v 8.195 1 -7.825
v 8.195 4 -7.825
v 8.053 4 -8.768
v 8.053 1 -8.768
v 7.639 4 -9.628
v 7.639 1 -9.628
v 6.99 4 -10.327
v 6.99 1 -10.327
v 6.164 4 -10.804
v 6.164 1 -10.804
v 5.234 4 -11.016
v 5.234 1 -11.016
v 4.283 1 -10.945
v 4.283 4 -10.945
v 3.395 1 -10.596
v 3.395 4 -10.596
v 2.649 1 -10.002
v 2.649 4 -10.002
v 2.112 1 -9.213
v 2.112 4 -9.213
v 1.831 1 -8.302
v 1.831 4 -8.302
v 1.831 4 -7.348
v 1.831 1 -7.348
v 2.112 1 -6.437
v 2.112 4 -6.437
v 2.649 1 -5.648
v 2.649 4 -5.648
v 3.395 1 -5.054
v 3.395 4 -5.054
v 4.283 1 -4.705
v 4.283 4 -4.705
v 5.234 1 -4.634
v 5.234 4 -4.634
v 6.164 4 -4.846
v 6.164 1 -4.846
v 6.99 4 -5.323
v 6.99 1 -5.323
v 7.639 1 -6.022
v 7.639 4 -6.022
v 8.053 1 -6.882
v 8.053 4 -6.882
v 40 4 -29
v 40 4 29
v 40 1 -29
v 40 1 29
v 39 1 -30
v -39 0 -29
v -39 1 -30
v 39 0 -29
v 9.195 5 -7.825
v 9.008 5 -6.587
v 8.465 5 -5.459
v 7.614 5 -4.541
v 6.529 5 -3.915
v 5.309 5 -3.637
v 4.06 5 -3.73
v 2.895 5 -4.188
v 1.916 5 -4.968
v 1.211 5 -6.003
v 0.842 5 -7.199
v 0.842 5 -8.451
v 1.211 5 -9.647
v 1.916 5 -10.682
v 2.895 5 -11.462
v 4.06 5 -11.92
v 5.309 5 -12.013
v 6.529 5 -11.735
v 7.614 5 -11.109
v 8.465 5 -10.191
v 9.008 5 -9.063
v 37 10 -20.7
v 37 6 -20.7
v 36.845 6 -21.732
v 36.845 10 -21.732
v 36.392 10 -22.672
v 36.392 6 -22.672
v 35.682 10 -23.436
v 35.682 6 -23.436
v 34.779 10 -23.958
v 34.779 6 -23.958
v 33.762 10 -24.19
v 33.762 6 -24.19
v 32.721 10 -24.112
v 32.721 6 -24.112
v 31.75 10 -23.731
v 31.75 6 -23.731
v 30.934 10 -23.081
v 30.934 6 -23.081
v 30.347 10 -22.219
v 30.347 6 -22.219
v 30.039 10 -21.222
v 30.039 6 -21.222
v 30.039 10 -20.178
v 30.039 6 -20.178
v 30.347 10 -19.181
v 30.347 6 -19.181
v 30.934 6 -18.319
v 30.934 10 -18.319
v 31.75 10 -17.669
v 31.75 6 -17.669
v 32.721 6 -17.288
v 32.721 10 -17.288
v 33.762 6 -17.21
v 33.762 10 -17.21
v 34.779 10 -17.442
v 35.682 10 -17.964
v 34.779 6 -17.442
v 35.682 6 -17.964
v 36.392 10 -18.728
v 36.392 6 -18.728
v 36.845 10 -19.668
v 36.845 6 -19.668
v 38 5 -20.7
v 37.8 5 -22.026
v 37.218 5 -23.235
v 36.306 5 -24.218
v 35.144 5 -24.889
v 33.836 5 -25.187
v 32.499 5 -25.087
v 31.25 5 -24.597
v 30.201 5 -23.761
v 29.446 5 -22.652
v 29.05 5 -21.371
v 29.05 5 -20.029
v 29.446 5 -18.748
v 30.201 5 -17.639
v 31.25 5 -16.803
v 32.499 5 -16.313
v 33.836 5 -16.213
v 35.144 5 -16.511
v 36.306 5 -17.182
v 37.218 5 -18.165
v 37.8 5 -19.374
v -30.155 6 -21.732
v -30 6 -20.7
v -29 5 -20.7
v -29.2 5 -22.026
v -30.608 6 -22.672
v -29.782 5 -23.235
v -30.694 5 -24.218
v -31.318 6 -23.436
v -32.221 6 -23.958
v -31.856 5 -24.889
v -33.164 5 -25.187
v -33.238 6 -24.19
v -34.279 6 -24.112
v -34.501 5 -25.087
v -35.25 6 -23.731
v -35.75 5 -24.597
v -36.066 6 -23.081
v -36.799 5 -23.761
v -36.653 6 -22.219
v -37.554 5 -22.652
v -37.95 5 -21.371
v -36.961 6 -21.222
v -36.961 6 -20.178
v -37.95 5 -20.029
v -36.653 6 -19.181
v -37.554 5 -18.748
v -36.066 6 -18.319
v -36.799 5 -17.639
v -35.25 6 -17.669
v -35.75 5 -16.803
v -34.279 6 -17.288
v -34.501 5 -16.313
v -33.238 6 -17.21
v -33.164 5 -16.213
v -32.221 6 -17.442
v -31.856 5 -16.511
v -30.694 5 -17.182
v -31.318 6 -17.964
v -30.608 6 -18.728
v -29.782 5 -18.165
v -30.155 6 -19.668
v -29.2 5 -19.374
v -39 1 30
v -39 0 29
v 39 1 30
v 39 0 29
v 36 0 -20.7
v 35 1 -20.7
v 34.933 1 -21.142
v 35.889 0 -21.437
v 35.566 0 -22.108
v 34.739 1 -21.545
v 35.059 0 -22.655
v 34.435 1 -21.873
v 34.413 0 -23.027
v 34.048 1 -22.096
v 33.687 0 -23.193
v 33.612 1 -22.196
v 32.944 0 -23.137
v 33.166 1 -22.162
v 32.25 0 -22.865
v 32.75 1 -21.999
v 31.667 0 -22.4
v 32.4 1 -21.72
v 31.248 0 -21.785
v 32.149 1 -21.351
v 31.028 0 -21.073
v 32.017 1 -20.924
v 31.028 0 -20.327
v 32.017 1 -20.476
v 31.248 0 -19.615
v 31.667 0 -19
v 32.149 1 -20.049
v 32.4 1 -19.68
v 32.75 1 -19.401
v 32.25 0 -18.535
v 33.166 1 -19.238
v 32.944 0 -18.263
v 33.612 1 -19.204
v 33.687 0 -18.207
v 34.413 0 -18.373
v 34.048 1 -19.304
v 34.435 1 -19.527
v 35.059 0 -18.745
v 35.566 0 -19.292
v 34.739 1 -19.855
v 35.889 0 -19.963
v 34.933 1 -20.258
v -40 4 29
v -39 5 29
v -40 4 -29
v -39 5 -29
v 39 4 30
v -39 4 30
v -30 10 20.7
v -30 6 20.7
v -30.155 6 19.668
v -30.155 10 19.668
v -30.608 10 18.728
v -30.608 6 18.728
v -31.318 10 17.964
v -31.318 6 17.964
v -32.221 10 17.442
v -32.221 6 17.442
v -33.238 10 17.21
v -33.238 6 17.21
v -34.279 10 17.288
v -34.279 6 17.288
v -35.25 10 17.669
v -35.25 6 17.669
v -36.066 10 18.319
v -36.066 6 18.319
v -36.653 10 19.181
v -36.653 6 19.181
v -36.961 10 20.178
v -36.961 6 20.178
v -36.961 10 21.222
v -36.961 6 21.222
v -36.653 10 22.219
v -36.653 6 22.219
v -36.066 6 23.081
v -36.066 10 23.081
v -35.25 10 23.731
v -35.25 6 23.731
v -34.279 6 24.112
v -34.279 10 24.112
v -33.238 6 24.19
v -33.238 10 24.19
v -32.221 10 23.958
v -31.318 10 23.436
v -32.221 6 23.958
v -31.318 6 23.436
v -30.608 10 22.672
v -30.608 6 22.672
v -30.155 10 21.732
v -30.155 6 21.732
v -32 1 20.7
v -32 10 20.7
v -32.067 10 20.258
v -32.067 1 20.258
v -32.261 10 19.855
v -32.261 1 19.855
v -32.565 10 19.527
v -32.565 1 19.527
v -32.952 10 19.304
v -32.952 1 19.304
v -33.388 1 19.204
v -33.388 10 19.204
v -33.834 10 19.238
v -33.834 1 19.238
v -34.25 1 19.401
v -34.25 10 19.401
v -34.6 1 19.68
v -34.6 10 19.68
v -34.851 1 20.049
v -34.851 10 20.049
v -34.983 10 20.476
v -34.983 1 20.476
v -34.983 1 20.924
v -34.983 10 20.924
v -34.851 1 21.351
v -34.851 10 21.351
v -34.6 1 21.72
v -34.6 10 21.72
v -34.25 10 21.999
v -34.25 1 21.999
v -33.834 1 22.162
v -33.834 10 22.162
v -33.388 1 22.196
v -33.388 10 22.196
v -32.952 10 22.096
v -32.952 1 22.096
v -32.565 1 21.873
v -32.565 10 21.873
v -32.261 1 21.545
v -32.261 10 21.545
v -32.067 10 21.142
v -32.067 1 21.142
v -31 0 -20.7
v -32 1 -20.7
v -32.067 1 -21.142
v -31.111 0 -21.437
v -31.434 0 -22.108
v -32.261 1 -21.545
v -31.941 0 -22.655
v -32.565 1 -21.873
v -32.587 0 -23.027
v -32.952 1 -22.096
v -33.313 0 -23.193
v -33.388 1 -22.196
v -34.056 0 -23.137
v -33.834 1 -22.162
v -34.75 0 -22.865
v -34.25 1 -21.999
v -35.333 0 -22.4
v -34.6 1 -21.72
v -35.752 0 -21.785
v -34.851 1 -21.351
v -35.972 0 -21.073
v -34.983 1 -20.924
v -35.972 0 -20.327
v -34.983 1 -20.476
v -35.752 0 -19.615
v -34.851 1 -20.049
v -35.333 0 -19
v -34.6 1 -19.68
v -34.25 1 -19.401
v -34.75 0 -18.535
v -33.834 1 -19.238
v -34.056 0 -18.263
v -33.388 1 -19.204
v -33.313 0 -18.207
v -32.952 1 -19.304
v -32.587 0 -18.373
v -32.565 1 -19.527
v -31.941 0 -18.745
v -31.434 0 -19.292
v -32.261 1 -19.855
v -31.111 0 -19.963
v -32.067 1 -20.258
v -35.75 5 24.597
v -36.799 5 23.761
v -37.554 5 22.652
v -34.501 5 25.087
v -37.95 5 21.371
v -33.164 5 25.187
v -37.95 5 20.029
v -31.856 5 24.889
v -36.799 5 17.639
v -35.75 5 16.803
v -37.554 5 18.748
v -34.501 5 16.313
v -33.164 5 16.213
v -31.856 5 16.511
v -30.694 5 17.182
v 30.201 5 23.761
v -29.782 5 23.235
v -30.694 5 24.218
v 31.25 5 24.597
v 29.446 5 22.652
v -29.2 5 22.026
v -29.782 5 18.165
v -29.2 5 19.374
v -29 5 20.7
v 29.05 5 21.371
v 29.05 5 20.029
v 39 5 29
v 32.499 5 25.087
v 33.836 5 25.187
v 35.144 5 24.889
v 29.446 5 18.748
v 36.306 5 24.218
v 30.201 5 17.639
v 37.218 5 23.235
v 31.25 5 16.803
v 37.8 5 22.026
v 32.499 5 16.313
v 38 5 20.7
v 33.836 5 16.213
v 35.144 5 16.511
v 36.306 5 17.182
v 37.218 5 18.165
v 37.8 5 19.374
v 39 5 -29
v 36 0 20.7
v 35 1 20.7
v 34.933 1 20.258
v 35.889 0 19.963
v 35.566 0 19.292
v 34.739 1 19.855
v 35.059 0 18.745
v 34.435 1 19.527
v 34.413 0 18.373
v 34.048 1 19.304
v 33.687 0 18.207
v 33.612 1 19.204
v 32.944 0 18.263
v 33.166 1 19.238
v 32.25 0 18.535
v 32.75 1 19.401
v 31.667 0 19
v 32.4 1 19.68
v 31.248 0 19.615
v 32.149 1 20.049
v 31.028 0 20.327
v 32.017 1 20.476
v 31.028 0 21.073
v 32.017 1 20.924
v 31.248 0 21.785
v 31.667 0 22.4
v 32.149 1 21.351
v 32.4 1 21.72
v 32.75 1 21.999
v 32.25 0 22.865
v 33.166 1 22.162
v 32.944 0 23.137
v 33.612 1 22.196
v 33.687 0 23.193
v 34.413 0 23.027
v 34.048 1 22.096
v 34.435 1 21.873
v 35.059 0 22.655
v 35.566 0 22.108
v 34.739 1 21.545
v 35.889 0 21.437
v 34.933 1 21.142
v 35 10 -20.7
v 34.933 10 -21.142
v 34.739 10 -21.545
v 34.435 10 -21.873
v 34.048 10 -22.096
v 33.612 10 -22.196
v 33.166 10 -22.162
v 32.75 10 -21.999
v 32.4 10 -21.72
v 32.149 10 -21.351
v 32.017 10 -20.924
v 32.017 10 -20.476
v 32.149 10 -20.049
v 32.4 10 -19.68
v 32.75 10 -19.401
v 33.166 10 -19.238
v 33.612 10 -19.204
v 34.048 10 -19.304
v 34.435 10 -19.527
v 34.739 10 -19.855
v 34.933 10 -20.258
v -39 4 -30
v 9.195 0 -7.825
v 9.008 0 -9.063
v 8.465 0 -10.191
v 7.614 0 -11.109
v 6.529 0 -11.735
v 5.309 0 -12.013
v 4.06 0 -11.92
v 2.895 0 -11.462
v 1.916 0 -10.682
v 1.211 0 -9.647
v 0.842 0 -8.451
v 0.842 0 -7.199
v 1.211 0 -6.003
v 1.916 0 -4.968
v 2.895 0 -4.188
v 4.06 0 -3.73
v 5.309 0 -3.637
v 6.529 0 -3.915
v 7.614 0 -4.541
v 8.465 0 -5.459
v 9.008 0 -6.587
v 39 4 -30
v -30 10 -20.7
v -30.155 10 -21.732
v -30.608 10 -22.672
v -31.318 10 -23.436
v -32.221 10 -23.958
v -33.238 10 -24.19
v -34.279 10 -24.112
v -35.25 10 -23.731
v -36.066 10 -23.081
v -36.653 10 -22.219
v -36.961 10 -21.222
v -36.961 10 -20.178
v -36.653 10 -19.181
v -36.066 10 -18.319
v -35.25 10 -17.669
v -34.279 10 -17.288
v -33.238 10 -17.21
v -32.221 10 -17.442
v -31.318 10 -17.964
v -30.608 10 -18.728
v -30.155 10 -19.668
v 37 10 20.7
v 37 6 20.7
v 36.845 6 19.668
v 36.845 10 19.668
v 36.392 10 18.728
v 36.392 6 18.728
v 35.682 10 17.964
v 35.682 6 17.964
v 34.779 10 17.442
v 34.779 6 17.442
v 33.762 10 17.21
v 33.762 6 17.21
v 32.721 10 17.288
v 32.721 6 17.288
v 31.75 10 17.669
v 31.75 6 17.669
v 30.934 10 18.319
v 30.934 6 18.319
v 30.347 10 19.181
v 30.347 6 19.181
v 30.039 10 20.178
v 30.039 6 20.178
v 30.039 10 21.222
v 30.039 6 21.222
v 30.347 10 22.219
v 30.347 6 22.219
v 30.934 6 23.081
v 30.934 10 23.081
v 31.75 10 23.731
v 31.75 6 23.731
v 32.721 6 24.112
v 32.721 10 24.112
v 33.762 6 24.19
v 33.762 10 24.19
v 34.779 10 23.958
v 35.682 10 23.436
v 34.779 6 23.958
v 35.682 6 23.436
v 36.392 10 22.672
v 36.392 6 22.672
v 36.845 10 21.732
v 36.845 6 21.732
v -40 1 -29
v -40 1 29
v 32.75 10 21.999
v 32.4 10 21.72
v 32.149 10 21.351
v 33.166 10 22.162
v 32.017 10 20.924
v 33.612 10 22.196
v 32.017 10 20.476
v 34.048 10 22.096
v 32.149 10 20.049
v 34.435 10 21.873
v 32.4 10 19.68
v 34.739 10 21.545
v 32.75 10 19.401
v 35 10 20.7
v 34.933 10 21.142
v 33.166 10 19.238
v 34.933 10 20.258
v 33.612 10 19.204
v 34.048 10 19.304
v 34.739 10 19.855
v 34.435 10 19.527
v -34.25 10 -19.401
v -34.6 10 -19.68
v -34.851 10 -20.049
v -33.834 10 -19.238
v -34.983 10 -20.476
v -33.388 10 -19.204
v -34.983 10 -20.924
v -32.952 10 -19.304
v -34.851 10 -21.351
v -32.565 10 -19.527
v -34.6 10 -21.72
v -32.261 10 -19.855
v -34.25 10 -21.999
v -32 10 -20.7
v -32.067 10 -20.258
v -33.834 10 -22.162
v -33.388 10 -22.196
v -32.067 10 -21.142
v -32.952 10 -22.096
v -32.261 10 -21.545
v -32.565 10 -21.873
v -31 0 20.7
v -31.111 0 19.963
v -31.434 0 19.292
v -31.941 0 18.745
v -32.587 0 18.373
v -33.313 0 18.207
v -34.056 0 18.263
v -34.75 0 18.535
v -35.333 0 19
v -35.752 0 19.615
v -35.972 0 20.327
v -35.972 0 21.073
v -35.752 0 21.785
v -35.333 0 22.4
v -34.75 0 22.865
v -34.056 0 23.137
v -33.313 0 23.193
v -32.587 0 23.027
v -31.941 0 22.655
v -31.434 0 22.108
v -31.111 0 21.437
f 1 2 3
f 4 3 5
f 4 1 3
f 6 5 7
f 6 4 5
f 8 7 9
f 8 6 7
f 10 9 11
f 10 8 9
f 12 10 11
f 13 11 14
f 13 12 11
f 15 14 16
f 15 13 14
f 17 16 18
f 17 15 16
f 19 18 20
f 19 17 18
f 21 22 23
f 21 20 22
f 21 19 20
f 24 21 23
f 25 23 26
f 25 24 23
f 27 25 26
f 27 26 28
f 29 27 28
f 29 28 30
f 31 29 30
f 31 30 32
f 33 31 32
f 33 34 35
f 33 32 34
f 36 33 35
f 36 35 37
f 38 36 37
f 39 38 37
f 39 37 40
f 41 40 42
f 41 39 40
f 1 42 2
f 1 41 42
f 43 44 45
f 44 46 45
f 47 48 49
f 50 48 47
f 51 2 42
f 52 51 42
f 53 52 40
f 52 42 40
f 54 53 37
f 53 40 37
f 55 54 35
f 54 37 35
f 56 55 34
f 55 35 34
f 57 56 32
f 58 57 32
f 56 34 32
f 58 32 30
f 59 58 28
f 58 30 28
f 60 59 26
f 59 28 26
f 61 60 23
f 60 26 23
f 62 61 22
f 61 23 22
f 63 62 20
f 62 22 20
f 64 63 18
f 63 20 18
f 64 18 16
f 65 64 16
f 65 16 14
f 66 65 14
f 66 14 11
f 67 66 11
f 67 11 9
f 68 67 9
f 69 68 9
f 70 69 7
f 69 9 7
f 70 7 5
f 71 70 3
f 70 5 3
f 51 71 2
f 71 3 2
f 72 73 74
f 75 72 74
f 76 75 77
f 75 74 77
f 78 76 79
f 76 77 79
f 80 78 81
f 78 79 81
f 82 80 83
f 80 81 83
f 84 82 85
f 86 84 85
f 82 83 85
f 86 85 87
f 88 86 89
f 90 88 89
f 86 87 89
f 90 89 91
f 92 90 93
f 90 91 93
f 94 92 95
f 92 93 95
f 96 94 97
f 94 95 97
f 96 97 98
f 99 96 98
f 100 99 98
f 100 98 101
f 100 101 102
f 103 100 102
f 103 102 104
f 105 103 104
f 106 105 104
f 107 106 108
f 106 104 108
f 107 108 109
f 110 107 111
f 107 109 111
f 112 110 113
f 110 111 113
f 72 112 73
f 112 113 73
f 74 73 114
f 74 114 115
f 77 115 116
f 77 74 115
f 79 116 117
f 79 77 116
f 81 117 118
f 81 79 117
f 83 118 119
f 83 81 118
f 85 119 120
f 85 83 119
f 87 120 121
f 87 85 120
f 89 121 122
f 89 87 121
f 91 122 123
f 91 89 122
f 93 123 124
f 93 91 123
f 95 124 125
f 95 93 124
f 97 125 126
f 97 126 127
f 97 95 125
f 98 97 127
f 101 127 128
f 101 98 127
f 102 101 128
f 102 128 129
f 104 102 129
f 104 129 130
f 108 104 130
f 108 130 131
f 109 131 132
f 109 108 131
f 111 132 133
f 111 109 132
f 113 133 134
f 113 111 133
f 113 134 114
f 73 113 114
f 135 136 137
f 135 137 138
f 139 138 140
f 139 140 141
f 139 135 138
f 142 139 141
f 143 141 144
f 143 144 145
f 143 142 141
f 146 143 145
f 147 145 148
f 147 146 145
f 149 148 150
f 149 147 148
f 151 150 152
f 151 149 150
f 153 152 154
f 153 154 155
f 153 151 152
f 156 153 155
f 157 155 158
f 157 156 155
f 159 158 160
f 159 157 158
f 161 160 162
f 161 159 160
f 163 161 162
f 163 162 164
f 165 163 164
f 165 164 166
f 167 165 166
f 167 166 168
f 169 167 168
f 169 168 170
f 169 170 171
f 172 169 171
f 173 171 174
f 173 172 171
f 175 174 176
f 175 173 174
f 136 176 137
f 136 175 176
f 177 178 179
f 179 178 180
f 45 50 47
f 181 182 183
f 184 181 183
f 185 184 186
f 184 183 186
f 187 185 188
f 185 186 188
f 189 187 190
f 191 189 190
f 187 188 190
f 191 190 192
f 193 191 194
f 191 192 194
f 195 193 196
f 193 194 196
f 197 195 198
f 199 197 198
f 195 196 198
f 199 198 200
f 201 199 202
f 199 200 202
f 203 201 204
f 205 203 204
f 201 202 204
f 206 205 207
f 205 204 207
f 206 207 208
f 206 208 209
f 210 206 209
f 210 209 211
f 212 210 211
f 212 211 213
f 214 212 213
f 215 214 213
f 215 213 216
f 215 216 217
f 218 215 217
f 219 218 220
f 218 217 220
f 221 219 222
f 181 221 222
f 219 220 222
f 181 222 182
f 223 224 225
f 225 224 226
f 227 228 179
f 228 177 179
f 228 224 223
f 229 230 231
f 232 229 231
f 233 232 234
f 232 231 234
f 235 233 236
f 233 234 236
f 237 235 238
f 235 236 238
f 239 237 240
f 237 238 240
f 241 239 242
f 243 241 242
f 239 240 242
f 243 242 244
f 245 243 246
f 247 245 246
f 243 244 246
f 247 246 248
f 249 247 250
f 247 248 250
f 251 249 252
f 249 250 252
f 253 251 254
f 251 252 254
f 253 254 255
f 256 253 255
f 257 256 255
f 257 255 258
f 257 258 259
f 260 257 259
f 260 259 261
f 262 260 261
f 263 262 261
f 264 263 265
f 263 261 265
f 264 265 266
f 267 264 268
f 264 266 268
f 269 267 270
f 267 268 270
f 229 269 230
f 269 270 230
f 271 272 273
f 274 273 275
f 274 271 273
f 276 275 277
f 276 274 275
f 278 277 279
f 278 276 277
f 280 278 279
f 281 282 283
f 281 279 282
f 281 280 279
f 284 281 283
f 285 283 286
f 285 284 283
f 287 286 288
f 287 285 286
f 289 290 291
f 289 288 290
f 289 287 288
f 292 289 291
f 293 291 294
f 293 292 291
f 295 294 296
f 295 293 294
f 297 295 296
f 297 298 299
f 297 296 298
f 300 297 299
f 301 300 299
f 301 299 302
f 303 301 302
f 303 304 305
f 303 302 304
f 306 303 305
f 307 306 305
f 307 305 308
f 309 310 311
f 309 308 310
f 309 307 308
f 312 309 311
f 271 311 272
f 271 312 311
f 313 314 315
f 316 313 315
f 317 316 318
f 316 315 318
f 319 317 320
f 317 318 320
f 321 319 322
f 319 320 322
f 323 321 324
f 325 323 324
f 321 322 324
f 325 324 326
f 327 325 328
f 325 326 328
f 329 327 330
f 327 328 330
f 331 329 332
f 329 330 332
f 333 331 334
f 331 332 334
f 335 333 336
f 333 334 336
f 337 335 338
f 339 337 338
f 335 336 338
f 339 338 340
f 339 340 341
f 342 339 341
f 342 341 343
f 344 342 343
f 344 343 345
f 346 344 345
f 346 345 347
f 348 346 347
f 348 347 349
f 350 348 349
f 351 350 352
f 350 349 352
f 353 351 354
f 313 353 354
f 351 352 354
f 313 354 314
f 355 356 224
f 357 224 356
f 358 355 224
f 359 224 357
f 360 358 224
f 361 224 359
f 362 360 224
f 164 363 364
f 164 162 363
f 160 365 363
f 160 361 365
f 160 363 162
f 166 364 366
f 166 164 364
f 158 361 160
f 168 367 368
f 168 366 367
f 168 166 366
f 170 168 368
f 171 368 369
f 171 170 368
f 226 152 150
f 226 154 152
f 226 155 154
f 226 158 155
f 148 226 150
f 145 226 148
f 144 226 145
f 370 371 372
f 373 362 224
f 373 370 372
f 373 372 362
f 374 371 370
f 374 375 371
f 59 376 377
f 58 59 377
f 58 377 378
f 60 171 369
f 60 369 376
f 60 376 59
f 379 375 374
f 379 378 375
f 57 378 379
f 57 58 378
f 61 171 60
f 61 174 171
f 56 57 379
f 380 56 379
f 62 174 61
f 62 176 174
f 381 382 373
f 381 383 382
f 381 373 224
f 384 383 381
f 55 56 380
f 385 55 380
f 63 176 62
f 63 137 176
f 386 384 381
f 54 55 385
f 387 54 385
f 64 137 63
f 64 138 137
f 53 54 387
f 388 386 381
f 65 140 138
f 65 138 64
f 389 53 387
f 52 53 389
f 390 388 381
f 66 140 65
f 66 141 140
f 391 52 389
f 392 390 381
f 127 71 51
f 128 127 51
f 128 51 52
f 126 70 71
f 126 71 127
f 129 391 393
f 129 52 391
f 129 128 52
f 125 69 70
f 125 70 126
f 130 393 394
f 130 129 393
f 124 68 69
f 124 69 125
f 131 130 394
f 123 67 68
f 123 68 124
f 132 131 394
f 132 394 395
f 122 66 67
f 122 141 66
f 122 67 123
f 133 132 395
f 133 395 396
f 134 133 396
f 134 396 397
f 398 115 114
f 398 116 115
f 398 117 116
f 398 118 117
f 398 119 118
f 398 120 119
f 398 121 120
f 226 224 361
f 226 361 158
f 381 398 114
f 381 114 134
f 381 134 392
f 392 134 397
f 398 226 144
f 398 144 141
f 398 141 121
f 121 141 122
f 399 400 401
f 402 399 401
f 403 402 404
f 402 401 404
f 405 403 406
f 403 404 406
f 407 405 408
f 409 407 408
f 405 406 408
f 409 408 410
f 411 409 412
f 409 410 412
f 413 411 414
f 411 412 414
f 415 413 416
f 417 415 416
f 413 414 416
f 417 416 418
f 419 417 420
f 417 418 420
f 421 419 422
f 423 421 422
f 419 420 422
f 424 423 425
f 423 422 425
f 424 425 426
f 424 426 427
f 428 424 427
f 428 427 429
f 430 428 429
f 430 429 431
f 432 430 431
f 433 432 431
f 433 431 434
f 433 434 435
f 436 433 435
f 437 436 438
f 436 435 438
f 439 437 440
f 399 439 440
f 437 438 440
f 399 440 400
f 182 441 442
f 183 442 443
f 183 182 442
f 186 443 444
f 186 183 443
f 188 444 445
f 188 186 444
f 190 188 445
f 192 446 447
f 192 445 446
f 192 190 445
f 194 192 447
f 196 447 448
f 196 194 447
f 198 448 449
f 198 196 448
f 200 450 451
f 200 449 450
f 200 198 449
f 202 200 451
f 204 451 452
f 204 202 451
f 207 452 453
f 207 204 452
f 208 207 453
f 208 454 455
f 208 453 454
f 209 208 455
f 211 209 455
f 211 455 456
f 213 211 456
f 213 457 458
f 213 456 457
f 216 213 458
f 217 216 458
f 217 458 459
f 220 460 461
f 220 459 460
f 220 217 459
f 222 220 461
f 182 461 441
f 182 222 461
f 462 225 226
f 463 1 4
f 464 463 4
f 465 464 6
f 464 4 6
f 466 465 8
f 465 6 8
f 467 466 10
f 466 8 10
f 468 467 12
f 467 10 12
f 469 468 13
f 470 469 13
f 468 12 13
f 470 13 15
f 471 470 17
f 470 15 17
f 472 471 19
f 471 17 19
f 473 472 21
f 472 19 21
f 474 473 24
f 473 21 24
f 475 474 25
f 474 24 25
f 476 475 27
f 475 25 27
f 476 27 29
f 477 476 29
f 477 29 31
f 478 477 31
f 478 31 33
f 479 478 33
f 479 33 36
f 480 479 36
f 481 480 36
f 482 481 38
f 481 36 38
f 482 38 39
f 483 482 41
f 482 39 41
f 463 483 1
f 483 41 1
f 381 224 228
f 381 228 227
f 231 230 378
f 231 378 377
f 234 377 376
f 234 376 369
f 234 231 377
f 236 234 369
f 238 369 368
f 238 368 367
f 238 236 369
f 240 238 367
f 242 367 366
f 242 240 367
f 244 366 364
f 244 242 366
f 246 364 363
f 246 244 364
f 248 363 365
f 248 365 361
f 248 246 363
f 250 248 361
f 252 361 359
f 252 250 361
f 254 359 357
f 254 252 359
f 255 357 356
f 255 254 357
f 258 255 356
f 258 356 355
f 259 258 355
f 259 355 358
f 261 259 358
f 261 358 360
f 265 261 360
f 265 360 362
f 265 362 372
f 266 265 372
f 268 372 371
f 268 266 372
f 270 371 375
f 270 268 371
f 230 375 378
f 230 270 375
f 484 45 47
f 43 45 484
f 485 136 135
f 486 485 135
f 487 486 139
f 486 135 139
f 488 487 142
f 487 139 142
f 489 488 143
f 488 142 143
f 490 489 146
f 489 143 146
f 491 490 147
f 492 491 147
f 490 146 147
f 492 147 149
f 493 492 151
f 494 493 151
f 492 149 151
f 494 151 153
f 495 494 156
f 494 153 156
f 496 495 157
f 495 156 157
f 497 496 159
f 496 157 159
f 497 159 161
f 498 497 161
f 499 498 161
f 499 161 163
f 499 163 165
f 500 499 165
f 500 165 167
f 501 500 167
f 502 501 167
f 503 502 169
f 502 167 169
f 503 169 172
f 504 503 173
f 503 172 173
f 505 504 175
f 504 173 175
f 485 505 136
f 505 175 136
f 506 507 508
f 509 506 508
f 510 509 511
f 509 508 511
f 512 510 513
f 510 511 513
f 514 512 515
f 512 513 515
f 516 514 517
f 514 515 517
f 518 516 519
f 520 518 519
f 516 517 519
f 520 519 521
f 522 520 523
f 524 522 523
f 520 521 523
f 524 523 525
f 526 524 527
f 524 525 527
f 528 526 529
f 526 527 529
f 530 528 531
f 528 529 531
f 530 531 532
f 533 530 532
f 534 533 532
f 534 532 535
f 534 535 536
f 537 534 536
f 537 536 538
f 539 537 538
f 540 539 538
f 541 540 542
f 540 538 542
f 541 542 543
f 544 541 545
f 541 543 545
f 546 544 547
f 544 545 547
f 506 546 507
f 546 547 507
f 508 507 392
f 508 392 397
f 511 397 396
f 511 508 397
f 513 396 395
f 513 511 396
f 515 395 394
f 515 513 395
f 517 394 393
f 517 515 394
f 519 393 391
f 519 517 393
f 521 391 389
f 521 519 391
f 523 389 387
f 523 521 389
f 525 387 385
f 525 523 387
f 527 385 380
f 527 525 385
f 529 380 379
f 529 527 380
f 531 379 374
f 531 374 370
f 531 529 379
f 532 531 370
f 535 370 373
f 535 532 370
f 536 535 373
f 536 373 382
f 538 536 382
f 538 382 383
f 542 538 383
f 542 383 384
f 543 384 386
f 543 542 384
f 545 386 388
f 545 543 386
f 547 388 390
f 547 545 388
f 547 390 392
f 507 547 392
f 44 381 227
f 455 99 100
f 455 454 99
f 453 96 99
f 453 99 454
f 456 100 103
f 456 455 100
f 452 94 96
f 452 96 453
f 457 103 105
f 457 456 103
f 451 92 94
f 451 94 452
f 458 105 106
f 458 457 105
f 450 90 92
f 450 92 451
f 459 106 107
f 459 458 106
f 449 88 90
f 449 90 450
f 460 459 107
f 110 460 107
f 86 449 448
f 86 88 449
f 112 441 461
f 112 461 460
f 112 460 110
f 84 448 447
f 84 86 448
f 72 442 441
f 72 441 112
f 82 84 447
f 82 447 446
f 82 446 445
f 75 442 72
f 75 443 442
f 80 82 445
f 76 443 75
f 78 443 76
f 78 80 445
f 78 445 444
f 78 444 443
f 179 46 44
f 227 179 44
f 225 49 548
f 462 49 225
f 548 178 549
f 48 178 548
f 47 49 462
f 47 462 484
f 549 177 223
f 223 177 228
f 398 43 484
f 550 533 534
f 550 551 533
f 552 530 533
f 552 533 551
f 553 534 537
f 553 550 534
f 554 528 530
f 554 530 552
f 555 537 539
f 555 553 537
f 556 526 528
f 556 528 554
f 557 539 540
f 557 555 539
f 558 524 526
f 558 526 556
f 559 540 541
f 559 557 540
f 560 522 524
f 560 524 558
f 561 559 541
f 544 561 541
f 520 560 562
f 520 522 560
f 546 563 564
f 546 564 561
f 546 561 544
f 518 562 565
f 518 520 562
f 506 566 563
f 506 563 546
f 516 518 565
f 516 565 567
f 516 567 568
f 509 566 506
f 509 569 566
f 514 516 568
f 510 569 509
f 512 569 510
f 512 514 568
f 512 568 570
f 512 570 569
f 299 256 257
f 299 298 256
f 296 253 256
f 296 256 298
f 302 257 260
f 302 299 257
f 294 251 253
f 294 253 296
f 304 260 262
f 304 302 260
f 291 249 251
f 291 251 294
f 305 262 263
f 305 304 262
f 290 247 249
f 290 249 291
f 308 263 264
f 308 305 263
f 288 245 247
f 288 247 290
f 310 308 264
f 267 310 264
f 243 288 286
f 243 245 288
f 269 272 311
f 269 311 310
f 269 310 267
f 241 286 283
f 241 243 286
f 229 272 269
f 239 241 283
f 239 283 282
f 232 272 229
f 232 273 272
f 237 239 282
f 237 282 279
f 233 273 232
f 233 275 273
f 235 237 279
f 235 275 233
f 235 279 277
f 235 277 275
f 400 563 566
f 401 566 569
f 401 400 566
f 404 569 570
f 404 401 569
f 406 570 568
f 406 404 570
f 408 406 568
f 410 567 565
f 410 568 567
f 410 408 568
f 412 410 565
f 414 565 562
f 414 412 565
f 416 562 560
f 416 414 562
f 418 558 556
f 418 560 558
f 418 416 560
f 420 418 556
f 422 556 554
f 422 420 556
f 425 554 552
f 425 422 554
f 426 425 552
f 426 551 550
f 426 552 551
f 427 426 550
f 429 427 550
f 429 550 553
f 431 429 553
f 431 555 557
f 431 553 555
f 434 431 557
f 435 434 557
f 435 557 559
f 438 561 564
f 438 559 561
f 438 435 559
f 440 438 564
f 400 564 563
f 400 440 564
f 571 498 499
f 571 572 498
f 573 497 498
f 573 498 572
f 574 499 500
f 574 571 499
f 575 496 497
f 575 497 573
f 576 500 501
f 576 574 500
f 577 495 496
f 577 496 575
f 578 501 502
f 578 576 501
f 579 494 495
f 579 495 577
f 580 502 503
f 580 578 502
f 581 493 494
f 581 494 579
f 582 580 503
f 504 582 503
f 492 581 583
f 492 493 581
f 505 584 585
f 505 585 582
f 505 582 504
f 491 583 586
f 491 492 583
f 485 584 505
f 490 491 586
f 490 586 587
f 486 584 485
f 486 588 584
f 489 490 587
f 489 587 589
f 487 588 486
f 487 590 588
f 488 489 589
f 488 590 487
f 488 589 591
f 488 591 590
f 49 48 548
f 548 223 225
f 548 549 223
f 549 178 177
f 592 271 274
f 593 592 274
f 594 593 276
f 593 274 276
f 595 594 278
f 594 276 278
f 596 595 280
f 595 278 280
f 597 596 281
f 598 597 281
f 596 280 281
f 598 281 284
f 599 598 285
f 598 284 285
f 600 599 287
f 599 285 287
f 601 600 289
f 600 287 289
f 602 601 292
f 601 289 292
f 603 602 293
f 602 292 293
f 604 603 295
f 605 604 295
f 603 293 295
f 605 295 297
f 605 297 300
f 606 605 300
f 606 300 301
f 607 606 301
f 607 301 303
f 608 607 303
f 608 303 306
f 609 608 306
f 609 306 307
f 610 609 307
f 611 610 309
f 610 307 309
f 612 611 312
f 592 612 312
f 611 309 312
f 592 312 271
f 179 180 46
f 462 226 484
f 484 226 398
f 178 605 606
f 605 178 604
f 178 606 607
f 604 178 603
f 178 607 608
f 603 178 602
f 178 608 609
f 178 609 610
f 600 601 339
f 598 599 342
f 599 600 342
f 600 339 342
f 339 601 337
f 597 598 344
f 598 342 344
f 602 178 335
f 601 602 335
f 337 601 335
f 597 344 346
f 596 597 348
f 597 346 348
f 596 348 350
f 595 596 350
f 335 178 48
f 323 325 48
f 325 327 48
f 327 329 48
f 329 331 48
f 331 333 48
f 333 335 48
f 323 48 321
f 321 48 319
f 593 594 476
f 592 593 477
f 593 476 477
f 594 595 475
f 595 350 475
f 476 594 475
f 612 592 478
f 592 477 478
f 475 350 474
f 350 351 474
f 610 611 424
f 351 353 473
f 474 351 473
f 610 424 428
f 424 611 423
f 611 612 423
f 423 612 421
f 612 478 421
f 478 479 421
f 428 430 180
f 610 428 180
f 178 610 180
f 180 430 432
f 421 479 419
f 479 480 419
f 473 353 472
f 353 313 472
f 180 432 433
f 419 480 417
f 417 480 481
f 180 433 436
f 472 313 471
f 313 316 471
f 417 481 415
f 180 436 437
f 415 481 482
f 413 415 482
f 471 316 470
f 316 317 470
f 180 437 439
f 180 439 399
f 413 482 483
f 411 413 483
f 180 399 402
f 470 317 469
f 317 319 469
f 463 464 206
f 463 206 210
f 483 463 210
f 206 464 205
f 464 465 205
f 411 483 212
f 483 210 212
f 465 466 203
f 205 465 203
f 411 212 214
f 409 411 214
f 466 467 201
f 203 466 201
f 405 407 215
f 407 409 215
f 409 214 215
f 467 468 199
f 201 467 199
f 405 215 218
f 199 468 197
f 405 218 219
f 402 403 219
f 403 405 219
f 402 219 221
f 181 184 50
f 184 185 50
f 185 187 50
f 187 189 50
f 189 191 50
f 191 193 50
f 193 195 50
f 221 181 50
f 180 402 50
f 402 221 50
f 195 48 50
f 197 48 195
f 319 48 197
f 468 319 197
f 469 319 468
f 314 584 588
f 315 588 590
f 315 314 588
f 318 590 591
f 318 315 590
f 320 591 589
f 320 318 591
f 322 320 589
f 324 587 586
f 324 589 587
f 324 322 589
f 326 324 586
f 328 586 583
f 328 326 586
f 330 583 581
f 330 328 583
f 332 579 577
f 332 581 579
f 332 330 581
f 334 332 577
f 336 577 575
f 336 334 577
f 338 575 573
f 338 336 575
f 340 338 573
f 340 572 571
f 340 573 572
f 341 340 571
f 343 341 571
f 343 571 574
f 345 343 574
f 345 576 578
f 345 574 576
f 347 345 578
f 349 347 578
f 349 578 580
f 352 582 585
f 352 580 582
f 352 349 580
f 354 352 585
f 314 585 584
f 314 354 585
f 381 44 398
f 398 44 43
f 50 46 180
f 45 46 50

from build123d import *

# Parameters (mm, degrees)
SKETCH3_W           = 80
SKETCH3_H           = 60
BOSS_EXTRUDE1_DEPTH = 5
SKETCH5_R           = 3.5
BOSS_EXTRUDE2_DEPTH = 5
SKETCH6_R           = 1.5
SKETCH6_R_2         = 3.2
CUT_EXTRUDE1_DEPTH  = 11
CHAMFER1_SIZE       = 1


with BuildPart() as part:
    # Sketch3 → Boss-Extrude1 (new body)
    with BuildSketch(Plane(origin=(0, 0, 0), x_dir=(1, 0, 0), z_dir=(0, 1, 0))):
        Rectangle(SKETCH3_W, SKETCH3_H)
    extrude(amount=BOSS_EXTRUDE1_DEPTH)

    # Sketch5 → Boss-Extrude2 (add)
    with BuildSketch(Plane(origin=(0, 5, 0), x_dir=(1, 0, 0), z_dir=(0, 1, 0))):
        with Locations((33.5, 20.7)):
            Circle(SKETCH5_R)
        with Locations((33.5, -20.7)):
            Circle(SKETCH5_R)
        with Locations((-33.5, -20.7)):
            Circle(SKETCH5_R)
        with Locations((-33.5, 20.7)):
            Circle(SKETCH5_R)
    extrude(amount=BOSS_EXTRUDE2_DEPTH)

    # Sketch6 → Cut-Extrude1 (cut, through all)
    with BuildSketch(Plane(origin=(0, 0, 0), x_dir=(1, 0, 0), z_dir=(0, 1, 0))):
        with Locations((33.5, -20.7)):
            Circle(SKETCH6_R)
        with Locations((33.5, 20.7)):
            Circle(SKETCH6_R)
        with Locations((-33.5, -20.7)):
            Circle(SKETCH6_R)
        with Locations((-33.5, 20.7)):
            Circle(SKETCH6_R)
        with Locations((4.995, 7.825)):
            Circle(SKETCH6_R_2)
    extrude(amount=CUT_EXTRUDE1_DEPTH, mode=Mode.SUBTRACT)

    # Chamfer1
    chamfer1_edges = [part.edges().sort_by_distance(p)[0] for p in [
        (-40, 5, 0),
        (30, 5, -20.7),
        (0, 5, 30),
        (30, 5, 20.7),
        (-37, 5, 20.7),
        (-37, 5, -20.7),
        (32, 0, -20.7),
        (-35, 0, 20.7),
        (-35, 0, -20.7),
        (1.795, 0, -7.825),
        (1.795, 5, -7.825),
        (32, 0, 20.7),
        (40, 5, 0),
        (0, 0, 30),
        (-40, 0, 0),
        (0, 0, -30),
        (40, 0, 0),
        (40, 2.5, 30),
        (-40, 2.5, 30),
        (-40, 2.5, -30),
        (40, 2.5, -30),
        (0, 5, -30),
    ]]
    chamfer(chamfer1_edges, length=CHAMFER1_SIZE)


solid = part.part
